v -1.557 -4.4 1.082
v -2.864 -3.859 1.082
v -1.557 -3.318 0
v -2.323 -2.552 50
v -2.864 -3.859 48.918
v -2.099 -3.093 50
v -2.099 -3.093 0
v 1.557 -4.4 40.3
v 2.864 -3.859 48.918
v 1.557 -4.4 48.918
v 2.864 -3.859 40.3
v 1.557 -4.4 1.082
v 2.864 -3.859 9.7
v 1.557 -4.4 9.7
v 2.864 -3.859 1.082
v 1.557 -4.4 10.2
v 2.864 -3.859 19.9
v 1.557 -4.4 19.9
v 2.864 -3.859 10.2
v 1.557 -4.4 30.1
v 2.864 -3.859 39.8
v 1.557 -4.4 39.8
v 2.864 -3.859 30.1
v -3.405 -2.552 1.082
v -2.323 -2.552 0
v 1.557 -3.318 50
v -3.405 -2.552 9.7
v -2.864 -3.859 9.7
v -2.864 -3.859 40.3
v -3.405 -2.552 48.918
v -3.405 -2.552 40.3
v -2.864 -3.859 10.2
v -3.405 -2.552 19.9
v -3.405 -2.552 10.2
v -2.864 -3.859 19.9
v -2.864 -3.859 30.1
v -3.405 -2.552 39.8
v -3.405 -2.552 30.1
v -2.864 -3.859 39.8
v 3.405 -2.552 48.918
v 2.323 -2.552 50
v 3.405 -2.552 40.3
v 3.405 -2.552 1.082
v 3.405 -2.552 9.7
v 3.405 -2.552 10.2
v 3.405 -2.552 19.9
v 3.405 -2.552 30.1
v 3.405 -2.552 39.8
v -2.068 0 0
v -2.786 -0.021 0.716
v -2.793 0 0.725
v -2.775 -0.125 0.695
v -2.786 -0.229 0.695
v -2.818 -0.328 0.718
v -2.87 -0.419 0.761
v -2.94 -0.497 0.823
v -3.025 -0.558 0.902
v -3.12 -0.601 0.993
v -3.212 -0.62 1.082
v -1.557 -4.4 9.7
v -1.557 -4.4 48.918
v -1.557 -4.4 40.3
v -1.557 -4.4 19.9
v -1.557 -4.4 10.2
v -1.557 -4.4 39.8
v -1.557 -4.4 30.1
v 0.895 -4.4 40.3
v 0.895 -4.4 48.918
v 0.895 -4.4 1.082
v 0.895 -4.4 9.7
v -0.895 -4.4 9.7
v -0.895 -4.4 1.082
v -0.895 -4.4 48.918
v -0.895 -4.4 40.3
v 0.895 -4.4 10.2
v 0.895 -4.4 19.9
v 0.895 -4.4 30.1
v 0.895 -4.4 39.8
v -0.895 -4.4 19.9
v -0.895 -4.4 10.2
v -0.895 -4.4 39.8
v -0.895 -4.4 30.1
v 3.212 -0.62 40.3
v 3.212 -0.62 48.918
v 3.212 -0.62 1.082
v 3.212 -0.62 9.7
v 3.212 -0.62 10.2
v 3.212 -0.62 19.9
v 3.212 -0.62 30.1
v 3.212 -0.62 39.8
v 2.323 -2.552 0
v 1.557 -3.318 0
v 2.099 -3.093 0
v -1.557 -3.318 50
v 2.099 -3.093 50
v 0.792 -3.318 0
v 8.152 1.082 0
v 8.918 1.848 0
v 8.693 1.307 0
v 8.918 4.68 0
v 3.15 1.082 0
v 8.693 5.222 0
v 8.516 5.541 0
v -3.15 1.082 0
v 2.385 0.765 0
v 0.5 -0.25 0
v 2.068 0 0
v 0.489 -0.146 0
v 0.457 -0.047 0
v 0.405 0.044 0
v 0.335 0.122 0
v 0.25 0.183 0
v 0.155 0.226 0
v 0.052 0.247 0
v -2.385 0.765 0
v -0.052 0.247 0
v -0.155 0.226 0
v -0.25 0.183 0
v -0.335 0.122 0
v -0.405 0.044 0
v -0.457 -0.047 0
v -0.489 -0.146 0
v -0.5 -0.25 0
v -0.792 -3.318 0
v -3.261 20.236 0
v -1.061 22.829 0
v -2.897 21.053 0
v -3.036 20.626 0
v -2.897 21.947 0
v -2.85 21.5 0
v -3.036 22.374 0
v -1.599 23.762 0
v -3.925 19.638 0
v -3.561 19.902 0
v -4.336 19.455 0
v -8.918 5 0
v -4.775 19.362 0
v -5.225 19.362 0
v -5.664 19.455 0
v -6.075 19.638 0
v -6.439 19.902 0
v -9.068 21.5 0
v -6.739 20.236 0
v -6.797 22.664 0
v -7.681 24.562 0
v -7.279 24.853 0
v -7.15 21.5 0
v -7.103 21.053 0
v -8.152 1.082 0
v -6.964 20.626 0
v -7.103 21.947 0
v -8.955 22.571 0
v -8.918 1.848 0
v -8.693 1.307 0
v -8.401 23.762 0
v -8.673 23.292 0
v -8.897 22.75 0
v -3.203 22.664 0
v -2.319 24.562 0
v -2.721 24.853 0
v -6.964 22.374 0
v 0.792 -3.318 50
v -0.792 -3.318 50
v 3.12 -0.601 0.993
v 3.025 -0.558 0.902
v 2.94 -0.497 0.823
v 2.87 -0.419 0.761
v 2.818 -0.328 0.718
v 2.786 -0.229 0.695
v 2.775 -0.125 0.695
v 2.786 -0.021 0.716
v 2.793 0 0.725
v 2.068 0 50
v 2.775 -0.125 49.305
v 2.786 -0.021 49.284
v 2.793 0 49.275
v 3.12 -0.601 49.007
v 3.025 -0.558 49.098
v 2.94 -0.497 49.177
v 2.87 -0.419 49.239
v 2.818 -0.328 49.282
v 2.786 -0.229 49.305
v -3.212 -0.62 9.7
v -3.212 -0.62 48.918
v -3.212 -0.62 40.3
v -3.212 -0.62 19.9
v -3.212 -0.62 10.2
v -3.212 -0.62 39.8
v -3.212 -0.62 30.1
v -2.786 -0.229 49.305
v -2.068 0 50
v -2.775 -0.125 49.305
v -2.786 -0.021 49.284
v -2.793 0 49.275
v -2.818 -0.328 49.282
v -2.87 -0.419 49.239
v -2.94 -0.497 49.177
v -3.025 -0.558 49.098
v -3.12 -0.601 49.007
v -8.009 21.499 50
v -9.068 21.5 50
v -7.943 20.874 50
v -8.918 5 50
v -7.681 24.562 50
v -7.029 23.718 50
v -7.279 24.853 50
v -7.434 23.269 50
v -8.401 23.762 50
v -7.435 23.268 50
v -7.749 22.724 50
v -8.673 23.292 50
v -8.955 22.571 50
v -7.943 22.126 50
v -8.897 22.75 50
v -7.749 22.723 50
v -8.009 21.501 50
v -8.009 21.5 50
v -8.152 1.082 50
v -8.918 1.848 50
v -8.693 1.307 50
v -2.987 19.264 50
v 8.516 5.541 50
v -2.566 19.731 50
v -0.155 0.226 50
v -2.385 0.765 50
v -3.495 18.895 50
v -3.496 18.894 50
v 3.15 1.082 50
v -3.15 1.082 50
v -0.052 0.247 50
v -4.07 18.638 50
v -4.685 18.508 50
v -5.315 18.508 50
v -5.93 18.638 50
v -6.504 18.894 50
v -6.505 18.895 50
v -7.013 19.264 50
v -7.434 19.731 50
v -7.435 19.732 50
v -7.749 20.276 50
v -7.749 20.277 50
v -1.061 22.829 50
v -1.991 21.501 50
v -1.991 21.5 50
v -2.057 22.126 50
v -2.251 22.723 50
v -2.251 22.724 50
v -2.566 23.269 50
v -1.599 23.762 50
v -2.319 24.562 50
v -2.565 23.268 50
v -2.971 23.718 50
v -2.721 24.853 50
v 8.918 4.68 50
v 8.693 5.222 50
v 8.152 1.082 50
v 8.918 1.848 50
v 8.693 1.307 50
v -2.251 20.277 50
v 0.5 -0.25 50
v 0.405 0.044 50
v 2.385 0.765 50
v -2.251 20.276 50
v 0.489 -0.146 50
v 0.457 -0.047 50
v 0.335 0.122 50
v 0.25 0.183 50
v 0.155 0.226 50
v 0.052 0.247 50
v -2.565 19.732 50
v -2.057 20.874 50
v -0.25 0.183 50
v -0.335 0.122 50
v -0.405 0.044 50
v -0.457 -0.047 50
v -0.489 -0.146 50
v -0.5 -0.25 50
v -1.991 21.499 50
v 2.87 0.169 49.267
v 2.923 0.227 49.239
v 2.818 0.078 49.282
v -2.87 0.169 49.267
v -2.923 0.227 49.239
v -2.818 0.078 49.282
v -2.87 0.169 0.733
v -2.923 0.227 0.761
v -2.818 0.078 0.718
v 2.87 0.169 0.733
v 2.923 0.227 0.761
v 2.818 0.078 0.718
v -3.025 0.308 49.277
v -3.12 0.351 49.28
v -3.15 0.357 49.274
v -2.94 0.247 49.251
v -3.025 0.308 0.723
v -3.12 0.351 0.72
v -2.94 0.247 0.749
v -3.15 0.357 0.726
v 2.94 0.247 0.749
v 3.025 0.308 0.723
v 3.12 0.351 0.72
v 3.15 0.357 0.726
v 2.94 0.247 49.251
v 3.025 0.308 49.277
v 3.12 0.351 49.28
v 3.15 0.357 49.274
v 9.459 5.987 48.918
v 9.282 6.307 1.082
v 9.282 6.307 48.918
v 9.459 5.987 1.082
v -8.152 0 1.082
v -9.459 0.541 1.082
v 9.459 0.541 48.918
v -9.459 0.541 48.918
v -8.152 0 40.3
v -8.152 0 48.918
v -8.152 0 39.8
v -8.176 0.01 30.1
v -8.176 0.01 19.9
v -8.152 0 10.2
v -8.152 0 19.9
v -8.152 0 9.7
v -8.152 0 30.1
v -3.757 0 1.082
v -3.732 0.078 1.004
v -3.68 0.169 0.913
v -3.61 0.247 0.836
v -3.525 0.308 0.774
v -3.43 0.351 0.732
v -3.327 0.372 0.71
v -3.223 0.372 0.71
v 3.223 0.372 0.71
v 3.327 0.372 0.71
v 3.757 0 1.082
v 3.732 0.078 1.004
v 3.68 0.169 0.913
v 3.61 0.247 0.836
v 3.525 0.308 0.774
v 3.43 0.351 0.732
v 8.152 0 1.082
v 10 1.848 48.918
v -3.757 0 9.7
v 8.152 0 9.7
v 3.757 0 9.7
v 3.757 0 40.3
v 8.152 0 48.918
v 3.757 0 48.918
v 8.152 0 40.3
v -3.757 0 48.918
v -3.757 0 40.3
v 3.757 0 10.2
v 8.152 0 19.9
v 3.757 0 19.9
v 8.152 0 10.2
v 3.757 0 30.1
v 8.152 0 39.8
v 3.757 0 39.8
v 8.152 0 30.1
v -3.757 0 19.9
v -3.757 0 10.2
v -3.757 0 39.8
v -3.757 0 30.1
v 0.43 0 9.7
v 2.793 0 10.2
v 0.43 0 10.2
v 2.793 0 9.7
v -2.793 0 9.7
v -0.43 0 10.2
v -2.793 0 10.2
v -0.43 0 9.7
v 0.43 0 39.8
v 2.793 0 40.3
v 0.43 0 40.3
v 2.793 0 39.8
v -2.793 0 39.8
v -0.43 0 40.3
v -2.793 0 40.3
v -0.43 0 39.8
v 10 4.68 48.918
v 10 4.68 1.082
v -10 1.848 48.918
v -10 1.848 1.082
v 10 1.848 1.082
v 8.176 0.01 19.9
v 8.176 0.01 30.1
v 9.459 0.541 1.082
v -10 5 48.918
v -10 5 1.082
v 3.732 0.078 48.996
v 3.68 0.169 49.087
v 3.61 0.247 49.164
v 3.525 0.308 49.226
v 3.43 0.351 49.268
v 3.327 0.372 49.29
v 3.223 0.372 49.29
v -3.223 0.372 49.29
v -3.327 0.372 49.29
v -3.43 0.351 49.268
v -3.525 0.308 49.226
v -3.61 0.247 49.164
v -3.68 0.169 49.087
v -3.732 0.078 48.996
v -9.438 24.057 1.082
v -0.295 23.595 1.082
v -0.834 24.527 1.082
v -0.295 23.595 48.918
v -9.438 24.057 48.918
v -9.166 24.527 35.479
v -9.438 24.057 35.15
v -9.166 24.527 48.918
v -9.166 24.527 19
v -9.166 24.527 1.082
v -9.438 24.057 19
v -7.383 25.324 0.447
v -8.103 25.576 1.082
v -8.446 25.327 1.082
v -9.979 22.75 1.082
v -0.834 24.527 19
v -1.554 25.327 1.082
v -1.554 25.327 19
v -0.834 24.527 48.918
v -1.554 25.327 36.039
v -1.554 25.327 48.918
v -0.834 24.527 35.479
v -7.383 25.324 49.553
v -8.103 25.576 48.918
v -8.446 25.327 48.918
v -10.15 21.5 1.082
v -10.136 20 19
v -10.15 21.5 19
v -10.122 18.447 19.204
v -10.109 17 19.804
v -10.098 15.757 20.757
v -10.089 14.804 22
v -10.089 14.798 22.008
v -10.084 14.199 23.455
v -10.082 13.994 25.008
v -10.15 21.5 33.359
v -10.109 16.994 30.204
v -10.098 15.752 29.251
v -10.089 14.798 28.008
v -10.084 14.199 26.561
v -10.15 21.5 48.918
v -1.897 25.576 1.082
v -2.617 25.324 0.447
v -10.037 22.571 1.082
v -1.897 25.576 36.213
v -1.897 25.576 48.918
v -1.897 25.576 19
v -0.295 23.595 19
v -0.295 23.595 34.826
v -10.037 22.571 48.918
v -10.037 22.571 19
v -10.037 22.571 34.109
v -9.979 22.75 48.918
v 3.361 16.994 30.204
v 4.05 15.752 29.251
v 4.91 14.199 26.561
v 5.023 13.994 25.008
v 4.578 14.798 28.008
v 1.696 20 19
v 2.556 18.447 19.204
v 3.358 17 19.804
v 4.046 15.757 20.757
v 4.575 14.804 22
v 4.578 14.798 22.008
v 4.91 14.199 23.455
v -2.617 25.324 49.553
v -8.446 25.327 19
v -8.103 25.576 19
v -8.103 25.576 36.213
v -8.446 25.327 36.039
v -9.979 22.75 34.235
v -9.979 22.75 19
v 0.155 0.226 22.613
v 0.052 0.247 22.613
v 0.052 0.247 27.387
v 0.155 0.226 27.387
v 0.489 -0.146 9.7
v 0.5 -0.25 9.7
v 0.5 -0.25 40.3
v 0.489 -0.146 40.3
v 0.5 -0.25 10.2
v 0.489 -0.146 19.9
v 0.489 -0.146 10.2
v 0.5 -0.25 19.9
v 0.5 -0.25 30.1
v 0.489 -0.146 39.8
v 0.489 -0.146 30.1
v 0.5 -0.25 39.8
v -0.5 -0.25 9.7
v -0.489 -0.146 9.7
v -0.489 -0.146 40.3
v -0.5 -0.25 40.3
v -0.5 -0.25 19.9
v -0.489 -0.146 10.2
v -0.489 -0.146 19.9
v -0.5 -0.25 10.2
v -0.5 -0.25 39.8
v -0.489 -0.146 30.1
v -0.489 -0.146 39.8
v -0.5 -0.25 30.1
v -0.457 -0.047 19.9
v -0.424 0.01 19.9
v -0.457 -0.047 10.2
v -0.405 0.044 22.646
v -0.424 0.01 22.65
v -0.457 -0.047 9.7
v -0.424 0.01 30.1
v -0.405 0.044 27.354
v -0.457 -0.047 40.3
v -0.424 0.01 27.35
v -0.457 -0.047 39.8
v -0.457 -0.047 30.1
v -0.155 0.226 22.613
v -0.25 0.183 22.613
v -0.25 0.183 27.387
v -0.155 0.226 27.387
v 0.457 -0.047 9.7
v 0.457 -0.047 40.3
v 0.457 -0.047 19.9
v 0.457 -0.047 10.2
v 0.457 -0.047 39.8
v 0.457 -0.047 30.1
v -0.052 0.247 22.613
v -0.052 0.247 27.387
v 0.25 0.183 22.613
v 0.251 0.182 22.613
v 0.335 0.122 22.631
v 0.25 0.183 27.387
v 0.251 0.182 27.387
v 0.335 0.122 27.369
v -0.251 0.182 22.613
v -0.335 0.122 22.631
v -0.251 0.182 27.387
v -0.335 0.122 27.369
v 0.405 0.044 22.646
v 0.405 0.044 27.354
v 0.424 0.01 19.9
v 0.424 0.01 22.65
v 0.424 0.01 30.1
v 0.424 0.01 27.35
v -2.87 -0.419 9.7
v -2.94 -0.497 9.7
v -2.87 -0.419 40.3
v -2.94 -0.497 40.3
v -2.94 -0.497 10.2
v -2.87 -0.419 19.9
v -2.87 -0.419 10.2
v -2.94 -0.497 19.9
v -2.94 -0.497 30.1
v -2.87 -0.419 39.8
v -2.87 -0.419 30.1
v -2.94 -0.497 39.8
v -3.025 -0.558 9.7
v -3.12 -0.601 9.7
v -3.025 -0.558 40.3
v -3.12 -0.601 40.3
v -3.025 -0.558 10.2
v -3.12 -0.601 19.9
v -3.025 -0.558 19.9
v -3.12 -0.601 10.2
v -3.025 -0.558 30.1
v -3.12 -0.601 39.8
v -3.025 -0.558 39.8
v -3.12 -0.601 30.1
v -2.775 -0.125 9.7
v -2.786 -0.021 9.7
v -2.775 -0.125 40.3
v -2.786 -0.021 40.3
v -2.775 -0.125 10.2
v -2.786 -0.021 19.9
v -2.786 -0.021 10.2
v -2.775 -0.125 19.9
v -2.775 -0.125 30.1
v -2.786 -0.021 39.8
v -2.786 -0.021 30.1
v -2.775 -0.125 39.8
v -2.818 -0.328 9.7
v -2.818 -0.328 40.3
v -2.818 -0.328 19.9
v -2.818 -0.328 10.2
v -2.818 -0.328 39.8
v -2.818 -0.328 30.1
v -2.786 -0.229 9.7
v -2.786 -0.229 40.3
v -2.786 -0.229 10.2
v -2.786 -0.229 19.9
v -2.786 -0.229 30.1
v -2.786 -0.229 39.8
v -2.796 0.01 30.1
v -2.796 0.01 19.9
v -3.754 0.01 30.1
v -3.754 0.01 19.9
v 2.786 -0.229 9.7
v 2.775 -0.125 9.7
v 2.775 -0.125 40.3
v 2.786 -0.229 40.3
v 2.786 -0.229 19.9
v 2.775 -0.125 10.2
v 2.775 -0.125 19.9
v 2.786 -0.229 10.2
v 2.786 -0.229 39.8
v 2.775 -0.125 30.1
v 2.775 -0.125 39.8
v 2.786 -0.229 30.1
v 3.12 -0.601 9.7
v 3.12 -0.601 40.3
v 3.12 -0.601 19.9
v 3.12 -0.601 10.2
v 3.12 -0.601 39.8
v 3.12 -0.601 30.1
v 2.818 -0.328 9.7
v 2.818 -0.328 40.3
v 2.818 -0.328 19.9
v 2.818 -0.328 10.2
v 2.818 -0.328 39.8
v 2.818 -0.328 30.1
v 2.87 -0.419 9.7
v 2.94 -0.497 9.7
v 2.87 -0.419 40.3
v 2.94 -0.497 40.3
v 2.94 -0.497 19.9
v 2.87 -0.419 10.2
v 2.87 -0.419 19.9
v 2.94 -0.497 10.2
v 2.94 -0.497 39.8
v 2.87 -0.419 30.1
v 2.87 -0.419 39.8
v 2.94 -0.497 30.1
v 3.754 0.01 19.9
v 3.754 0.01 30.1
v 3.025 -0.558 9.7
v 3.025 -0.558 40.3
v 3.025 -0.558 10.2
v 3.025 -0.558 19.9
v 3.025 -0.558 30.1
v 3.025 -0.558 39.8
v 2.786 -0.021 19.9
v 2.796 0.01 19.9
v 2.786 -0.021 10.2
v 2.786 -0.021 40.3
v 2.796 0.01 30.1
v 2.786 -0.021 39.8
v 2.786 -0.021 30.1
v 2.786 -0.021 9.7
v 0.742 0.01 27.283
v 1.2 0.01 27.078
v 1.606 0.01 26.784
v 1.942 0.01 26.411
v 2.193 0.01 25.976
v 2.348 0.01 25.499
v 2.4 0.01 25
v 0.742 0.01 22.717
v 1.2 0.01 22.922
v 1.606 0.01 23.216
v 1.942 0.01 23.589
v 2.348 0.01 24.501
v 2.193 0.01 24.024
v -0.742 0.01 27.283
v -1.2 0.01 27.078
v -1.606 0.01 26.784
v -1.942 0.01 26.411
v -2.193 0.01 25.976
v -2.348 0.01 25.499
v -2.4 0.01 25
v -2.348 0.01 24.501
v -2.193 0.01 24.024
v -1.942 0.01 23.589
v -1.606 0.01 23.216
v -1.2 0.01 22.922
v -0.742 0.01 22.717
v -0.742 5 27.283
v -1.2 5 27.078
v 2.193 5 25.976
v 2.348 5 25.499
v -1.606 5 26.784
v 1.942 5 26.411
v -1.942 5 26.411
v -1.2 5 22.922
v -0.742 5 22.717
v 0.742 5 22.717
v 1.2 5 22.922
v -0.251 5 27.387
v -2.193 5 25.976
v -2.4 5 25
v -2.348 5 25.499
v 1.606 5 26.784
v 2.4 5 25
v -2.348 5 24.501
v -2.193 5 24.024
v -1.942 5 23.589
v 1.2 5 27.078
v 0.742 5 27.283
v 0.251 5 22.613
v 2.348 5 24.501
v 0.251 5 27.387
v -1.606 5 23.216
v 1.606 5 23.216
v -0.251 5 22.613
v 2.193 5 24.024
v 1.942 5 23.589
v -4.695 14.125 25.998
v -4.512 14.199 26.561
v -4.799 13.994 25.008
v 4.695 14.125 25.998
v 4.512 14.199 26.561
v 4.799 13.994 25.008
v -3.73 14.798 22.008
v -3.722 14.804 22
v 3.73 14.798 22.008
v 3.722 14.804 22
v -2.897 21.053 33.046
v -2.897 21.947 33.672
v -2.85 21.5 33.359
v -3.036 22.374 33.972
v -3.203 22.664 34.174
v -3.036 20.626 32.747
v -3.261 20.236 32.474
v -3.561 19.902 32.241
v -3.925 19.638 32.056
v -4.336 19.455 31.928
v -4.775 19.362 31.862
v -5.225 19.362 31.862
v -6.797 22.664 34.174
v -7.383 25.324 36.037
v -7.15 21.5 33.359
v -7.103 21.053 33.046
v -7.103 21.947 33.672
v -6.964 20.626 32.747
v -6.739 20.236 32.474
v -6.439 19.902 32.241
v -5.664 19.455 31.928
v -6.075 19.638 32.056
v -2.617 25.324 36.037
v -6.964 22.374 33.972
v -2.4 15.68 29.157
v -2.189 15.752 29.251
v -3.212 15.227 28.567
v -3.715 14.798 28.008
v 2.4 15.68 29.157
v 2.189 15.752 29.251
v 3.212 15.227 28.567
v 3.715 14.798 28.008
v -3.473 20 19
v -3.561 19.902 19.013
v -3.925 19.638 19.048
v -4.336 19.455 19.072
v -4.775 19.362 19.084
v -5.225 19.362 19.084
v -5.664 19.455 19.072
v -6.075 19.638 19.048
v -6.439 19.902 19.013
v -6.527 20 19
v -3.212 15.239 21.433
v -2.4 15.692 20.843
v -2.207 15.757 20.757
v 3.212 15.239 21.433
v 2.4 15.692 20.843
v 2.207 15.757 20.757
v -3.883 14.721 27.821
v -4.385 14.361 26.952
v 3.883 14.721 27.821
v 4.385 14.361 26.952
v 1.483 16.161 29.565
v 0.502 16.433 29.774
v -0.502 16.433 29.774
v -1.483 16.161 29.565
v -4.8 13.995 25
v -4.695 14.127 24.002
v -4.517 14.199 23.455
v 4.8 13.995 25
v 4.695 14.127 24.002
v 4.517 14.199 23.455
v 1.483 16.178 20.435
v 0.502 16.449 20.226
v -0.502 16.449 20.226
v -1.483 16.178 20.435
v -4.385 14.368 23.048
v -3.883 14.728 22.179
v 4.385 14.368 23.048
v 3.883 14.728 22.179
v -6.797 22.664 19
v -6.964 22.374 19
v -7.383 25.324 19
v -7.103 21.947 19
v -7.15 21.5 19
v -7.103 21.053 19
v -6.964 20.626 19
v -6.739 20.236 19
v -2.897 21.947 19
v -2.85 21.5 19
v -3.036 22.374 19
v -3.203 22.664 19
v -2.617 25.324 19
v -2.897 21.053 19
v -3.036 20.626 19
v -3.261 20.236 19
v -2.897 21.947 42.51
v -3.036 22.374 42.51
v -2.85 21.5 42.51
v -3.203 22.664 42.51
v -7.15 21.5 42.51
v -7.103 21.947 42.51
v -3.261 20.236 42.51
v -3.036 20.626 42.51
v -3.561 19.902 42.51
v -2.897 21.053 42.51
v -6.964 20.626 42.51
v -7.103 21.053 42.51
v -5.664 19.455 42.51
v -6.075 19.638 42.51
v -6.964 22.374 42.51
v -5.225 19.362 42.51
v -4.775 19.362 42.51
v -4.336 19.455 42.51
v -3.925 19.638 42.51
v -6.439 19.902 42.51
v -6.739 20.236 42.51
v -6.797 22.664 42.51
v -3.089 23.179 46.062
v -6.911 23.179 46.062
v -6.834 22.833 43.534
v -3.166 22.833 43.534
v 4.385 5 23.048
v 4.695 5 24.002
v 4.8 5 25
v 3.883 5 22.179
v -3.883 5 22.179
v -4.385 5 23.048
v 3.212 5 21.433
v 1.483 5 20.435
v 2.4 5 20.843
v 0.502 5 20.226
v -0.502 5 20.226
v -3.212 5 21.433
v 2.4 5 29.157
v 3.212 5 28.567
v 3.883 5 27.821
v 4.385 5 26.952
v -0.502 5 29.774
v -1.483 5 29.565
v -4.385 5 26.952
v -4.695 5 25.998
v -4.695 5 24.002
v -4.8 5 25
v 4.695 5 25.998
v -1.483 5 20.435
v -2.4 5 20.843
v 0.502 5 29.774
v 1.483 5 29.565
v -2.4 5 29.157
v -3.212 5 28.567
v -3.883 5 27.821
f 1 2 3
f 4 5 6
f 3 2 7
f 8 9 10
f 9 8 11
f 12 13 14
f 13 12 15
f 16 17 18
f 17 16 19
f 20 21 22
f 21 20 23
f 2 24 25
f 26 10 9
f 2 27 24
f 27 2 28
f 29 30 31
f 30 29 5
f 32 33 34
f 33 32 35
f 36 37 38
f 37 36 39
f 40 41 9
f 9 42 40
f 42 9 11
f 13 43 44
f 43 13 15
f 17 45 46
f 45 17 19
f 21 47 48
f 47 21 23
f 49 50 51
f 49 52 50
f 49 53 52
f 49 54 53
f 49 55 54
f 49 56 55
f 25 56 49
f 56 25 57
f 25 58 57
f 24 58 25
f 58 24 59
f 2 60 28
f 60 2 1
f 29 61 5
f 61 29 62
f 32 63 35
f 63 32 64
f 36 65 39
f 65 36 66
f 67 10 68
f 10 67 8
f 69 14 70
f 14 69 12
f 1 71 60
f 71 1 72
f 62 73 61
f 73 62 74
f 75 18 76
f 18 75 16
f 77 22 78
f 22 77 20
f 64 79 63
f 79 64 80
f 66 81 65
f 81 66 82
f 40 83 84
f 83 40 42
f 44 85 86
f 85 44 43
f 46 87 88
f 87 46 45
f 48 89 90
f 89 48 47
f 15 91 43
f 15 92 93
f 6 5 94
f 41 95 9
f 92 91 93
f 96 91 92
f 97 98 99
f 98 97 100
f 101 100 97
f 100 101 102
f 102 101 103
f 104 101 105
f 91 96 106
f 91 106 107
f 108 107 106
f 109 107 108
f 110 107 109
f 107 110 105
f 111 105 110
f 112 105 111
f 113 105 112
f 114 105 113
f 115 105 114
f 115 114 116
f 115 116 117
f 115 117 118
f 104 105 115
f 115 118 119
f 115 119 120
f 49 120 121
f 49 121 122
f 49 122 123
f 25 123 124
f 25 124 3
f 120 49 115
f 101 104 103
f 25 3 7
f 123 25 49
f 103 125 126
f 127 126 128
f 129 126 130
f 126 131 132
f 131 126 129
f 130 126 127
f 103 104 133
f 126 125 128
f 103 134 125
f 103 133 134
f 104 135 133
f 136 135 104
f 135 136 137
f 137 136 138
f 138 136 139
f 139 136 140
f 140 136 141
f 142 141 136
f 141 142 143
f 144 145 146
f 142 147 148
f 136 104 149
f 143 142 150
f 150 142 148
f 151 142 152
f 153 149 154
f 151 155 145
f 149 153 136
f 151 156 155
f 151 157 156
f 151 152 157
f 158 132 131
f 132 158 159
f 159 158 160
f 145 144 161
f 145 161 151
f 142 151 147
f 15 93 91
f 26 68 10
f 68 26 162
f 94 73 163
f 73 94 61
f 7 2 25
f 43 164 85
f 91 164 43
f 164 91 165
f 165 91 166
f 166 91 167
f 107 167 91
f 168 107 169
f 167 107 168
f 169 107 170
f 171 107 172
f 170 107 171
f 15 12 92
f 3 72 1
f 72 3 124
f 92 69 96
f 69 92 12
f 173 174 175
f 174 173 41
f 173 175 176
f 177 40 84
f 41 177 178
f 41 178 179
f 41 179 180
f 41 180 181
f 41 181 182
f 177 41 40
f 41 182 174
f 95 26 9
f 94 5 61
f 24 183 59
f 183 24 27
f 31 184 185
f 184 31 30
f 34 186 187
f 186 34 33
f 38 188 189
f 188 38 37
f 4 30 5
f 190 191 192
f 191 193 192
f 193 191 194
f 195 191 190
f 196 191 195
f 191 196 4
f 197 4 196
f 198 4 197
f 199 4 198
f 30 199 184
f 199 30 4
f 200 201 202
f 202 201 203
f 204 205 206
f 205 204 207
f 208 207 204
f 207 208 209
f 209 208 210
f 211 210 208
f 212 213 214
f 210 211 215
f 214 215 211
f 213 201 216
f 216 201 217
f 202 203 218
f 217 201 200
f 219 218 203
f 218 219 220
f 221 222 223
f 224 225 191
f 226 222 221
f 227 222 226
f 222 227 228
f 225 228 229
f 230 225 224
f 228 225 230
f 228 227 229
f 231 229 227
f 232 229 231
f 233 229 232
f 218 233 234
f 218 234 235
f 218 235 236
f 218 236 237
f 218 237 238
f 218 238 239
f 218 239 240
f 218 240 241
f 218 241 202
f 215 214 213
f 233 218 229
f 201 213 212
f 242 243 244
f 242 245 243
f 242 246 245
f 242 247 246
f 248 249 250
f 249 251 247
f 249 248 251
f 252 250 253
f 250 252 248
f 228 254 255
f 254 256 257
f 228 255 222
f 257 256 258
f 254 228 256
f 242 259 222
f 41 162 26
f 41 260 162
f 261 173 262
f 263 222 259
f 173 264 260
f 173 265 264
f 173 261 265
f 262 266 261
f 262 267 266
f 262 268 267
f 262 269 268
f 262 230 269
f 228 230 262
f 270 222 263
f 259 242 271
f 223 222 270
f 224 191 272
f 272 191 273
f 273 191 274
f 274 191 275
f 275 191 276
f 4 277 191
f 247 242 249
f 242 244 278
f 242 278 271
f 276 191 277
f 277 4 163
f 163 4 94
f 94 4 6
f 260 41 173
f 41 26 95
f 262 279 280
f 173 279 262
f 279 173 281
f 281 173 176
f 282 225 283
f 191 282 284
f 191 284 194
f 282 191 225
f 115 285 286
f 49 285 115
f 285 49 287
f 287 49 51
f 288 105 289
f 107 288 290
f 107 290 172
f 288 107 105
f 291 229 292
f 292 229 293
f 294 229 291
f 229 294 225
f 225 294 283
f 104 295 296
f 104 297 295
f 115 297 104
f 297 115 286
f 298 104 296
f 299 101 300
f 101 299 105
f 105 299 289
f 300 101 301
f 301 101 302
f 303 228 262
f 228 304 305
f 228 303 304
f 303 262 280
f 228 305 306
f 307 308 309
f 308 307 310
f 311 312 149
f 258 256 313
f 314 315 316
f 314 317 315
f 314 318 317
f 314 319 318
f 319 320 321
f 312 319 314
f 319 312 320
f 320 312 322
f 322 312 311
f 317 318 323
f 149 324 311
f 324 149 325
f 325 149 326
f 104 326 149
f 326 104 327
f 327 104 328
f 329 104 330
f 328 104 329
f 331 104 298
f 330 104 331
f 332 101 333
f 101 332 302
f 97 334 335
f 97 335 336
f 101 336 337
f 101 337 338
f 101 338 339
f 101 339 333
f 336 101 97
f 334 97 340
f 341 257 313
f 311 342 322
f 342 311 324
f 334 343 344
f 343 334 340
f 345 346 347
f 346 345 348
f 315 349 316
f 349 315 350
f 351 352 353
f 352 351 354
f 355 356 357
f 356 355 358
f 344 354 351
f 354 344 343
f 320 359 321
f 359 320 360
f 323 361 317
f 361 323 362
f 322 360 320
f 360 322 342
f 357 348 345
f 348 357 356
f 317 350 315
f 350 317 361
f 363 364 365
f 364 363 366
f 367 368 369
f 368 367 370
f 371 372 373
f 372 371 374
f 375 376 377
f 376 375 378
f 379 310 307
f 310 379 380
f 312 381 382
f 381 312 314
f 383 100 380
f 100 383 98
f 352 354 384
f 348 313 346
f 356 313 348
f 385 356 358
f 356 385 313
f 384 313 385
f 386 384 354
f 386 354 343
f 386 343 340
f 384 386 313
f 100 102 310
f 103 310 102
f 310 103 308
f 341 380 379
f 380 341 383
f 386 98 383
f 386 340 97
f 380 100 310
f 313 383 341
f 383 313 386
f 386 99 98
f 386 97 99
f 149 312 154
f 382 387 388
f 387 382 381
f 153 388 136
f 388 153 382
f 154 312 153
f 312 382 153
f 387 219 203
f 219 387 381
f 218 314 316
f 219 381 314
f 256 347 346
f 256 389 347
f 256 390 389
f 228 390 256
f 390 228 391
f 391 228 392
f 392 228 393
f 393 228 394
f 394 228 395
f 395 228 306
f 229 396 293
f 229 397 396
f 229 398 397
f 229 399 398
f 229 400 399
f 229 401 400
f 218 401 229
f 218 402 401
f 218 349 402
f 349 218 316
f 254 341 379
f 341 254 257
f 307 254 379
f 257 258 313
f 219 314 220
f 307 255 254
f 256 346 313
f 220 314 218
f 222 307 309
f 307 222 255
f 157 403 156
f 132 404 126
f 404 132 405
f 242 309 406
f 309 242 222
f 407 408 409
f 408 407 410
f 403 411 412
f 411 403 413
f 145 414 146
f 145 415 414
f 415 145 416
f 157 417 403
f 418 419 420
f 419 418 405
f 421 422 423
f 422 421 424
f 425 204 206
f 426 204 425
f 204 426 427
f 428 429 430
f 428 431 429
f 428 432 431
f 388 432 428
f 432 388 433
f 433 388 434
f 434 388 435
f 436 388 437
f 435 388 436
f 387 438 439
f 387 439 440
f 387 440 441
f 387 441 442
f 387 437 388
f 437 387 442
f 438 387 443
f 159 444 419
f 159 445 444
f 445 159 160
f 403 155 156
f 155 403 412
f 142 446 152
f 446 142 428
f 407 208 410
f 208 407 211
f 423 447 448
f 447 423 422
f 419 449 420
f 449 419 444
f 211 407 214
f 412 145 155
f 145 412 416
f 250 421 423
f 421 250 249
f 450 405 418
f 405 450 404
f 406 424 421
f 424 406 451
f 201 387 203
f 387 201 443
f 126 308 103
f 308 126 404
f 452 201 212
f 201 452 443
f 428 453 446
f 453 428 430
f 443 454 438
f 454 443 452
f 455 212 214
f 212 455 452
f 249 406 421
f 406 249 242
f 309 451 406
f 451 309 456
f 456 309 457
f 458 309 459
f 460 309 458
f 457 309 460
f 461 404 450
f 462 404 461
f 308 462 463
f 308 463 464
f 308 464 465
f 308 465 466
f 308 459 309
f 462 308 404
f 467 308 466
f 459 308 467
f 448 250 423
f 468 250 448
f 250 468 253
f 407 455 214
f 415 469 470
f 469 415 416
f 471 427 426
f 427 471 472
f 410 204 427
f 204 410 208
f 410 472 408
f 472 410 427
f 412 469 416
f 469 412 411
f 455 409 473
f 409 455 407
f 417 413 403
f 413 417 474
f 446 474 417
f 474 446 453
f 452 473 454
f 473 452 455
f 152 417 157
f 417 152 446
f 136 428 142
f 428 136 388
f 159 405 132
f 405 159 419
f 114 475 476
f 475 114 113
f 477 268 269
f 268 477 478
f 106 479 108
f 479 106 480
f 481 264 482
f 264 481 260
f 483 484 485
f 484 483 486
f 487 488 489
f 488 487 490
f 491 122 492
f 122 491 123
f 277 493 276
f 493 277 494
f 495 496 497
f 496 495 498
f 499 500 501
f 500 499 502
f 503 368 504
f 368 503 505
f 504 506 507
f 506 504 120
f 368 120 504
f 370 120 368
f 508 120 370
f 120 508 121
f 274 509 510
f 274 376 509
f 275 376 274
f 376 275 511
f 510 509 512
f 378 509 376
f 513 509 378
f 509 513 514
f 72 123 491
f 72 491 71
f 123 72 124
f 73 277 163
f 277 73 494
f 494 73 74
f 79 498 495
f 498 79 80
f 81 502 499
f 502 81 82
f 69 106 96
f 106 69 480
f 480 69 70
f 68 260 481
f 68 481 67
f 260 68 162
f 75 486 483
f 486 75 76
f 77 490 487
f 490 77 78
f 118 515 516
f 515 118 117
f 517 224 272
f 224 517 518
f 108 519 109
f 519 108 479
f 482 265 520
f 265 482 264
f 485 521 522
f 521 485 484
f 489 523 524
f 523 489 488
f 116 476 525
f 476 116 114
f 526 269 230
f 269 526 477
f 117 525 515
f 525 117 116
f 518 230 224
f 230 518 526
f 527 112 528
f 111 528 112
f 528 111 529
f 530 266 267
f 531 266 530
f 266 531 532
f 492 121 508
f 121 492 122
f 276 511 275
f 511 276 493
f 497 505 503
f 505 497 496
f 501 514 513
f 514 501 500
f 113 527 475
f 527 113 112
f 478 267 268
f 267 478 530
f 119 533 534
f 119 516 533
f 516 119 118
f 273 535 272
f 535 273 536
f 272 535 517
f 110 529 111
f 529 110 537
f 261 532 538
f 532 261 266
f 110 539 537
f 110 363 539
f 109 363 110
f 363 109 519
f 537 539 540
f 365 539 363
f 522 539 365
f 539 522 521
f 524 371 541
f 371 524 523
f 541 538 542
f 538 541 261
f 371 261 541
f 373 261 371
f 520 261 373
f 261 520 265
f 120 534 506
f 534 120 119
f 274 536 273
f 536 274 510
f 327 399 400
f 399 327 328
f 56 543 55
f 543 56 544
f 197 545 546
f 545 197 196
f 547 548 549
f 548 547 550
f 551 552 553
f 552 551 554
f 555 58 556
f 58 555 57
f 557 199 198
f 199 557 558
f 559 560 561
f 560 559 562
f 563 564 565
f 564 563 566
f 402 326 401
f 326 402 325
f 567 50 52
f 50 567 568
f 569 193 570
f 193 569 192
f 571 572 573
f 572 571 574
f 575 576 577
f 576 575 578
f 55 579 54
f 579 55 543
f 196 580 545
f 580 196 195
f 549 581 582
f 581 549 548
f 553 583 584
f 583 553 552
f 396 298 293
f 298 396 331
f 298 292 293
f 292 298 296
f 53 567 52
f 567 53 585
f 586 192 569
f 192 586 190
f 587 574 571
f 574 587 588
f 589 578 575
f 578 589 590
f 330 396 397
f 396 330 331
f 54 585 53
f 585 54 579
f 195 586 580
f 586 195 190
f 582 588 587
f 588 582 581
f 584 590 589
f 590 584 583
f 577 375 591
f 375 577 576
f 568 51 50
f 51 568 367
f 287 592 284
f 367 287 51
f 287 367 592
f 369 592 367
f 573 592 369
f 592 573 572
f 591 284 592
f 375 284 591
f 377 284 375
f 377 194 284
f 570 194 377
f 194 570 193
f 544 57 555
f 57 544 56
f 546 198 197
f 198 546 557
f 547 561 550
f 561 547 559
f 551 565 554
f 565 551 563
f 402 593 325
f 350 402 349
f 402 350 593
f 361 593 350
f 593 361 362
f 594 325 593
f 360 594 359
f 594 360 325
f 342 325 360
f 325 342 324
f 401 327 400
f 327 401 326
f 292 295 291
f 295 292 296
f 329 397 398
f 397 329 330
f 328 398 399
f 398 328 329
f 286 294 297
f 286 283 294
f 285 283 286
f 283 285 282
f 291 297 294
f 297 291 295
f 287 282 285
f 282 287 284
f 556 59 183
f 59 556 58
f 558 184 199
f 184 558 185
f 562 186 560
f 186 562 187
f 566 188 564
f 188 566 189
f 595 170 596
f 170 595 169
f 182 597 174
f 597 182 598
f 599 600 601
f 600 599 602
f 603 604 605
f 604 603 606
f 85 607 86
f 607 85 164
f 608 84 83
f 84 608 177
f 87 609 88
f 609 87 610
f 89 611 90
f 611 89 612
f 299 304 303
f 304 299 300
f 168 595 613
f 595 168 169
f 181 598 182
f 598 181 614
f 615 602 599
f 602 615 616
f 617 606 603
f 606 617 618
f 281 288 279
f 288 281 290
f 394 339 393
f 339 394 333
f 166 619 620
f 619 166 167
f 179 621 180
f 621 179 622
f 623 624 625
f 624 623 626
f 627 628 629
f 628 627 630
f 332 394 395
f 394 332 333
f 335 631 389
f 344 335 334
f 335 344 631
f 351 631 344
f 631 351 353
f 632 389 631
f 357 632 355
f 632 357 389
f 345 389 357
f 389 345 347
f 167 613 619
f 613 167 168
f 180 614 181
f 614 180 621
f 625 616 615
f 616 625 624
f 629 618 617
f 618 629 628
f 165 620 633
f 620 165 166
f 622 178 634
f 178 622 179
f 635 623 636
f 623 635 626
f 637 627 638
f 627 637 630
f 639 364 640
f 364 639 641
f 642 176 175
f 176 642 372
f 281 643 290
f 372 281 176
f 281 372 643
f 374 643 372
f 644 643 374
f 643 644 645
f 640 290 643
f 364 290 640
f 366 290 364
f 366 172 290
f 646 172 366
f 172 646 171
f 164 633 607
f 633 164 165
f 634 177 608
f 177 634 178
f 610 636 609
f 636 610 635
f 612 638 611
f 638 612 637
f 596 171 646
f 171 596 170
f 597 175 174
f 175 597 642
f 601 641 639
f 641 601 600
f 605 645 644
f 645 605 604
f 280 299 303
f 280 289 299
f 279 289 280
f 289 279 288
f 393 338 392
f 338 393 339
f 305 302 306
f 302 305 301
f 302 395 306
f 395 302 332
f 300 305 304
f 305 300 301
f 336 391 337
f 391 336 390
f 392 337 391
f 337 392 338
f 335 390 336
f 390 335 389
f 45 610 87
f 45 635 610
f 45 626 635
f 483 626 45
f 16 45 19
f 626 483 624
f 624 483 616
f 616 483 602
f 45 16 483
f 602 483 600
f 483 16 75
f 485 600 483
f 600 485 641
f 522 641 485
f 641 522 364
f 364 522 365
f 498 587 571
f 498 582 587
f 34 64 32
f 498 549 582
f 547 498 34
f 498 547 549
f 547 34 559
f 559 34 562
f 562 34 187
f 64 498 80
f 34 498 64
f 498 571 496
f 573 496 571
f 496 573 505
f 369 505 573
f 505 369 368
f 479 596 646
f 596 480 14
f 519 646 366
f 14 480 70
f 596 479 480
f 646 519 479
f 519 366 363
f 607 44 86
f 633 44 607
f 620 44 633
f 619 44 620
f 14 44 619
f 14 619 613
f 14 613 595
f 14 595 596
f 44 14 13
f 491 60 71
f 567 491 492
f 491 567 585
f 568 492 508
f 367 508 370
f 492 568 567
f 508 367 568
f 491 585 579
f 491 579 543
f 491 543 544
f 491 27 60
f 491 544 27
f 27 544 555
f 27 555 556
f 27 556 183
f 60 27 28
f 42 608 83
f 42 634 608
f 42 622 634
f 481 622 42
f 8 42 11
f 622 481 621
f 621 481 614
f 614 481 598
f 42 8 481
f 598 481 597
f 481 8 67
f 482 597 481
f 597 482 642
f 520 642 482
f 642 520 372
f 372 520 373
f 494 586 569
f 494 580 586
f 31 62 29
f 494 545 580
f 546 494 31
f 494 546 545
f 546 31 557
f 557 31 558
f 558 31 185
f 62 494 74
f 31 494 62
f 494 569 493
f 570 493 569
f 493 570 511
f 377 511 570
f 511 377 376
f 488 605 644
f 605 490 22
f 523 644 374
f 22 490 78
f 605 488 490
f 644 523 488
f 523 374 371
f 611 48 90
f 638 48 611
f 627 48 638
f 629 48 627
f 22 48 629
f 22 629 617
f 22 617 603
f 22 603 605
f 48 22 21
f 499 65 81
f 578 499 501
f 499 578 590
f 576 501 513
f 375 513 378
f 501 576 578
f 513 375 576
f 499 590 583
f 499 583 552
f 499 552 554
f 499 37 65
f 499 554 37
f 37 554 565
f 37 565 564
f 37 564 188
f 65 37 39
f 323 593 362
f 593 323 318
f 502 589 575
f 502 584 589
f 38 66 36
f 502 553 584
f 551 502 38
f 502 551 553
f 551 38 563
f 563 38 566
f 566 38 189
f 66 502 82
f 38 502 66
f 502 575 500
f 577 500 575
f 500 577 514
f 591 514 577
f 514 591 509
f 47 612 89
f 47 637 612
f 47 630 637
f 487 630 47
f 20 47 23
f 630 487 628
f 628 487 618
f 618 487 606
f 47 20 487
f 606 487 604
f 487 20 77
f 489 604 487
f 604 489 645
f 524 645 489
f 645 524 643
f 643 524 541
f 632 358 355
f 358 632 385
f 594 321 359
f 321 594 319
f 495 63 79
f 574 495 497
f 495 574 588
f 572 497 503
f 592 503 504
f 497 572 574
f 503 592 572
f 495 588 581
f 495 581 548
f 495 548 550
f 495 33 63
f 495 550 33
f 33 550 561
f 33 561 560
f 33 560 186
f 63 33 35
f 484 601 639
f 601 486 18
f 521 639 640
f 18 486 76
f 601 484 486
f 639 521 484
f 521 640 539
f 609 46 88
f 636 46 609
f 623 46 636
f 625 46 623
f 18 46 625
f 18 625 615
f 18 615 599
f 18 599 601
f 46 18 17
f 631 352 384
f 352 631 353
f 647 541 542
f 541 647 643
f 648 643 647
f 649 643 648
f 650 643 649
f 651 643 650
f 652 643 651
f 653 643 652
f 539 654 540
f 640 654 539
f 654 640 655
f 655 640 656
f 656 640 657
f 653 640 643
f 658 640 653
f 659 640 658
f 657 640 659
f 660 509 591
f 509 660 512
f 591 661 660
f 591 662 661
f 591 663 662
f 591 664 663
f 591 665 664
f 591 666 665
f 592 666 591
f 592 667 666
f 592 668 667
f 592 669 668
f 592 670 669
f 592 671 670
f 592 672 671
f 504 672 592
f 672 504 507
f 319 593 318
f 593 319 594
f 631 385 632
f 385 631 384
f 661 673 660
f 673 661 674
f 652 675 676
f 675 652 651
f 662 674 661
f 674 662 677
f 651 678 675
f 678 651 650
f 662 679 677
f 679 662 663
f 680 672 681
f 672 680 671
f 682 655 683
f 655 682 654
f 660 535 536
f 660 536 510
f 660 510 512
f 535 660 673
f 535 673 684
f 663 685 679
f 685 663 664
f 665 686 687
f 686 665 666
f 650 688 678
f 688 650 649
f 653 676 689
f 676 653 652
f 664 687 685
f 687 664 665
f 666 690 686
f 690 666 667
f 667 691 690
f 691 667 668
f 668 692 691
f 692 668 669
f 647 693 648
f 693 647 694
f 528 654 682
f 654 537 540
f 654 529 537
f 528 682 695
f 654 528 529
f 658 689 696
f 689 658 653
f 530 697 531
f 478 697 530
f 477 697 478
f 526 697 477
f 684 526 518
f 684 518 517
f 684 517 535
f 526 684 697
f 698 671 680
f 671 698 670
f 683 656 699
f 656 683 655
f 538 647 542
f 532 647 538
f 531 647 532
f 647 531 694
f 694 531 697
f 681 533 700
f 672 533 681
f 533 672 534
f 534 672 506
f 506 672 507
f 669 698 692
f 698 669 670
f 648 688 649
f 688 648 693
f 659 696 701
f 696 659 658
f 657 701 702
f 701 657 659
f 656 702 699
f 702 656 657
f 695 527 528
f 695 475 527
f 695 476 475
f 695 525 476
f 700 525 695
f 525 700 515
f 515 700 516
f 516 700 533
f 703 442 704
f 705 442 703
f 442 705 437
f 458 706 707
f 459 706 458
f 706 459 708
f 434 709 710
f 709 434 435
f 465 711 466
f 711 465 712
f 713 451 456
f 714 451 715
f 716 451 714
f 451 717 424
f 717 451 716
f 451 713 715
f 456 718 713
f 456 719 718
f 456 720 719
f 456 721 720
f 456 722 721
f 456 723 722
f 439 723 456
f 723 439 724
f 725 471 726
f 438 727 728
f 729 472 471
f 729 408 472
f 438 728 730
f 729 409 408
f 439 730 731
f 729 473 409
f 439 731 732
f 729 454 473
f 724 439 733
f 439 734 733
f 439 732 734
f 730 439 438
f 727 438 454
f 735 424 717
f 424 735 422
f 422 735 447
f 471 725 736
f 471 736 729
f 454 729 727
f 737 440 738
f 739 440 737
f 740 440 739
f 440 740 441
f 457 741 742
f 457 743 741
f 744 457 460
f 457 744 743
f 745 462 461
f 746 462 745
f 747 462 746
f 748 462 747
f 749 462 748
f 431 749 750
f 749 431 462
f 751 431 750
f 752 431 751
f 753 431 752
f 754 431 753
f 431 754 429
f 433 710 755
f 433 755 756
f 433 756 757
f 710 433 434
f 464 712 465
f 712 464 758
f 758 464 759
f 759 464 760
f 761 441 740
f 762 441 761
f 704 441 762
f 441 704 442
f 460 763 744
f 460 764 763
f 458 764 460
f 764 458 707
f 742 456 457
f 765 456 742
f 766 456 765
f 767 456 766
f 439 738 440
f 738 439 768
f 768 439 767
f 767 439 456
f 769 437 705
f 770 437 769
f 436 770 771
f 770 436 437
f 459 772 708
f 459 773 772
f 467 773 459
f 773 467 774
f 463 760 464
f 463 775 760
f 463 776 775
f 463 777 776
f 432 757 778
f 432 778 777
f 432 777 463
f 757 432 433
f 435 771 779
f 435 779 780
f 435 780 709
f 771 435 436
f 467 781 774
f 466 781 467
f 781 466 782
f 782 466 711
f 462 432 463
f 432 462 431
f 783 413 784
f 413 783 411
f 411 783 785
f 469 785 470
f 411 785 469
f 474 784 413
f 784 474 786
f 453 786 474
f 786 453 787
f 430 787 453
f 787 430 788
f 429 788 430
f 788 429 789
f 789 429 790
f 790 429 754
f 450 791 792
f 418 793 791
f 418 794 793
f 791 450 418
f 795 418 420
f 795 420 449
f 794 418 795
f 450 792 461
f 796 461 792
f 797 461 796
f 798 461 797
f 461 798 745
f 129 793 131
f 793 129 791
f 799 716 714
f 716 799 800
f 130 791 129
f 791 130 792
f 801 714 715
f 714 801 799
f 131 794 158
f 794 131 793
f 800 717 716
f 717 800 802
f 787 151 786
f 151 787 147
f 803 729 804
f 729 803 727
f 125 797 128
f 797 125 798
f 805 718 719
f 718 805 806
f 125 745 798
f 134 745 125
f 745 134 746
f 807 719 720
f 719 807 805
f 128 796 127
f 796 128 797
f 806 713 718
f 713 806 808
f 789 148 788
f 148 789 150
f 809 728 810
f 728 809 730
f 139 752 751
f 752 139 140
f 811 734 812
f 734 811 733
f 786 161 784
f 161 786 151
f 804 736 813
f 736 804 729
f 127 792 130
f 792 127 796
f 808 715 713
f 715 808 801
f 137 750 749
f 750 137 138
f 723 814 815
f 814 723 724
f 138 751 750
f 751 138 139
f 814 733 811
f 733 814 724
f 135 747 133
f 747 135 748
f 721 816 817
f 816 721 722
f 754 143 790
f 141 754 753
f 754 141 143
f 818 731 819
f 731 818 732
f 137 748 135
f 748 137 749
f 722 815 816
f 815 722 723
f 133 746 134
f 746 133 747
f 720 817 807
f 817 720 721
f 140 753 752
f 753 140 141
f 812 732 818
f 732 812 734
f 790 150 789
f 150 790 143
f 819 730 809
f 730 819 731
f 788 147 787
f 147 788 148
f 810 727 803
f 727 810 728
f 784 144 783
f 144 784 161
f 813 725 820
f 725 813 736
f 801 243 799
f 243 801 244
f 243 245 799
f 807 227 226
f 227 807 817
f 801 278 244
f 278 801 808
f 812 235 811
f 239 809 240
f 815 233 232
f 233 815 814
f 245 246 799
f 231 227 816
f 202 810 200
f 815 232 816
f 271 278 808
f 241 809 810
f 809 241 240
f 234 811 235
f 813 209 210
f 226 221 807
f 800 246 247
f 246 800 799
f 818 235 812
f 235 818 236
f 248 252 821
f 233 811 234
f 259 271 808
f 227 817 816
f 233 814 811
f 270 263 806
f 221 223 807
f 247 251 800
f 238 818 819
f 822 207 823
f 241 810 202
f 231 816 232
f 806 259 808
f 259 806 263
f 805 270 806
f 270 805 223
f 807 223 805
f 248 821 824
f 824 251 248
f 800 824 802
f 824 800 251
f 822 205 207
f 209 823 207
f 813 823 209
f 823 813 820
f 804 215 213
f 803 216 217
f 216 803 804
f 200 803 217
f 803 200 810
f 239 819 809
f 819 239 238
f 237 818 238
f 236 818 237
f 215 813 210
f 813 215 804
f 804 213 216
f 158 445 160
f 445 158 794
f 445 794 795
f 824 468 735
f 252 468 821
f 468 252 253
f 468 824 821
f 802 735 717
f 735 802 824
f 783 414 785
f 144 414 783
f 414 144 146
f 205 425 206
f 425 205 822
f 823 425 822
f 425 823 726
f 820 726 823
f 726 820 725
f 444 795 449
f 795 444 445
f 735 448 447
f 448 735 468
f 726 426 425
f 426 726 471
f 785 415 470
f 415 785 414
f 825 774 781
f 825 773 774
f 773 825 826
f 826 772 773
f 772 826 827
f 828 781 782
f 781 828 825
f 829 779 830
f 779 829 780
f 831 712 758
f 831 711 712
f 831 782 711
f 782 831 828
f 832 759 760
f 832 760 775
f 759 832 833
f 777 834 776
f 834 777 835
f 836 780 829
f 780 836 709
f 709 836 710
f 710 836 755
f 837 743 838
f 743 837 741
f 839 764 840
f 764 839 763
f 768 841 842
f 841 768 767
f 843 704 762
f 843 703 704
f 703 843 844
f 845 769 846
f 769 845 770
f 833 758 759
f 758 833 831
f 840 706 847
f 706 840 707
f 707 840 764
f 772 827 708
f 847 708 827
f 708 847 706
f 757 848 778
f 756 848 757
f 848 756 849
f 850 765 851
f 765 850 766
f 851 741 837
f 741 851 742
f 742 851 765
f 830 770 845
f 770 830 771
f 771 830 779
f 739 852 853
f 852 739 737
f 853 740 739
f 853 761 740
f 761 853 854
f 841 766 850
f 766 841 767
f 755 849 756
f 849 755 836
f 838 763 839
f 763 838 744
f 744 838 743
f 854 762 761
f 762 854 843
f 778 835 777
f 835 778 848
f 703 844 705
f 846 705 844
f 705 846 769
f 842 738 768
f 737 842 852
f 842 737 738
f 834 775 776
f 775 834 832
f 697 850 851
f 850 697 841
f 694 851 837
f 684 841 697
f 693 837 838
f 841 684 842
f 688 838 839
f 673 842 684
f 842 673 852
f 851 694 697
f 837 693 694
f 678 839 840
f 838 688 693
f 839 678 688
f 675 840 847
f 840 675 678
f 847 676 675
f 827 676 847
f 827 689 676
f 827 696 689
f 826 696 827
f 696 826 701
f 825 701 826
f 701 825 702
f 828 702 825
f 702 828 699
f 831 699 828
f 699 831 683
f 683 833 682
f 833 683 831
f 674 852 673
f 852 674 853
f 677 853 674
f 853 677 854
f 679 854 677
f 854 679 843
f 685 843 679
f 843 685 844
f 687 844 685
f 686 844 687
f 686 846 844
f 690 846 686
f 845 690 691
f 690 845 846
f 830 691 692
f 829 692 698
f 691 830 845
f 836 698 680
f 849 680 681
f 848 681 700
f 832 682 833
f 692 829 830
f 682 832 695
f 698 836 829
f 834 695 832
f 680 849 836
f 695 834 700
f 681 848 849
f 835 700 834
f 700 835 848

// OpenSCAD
// file: ../chamferer.scad
INFINITY = 10000;
ATOM = .01;

module chamfer_tool(r, fn, tool) {
    if (tool=="sphere") {
        sphere(r, $fn=fn);
    }
    else if (tool=="hemisphere-up") {
        intersection() {
            sphere(r, $fn=fn);
            cylinder(r=r*2, h=r*2);
        }
    }
    else if (tool=="cone") {
        cylinder(r, r, 0, $fn=fn);
        scale([1, 1, -1])
        cylinder(r, r, 0, $fn=fn);
    }
    else if (tool=="cone-up") {
        cylinder(r, r, 0, $fn=fn, center=true);
    }
    else if (tool=="cone-down") {
        scale([1, 1, -1])
        cylinder(r, r, 0, $fn=fn, center=true);
    }
    else if (tool=="octahedron") {
        resize([r*2, r*2, r*2]) {
            cylinder(r, r, 0, $fn=4);
            scale([1, 1, -1])
            cylinder(r, r, 0, $fn=4);
        }
    }
    else if (tool=="pyramid") {
        resize([r*2, r*2, r*2]) {
            cylinder(r, r, 0, center=true, $fn=4);
        }
    }
    else if (tool=="rpyramid") {
        resize([r*2, r*2, r*2]) {
            cylinder(r, 0, r, center=true, $fn=4);
        }
    }
    else if (tool=="cylinder-z" || tool=="cylinder") {
        cylinder(r=r, h=ATOM, $fn=fn, center=true);
    }
    else if (tool=="cylinder-x") {
        rotate([0, 90, 0])
        cylinder(r=r, h=ATOM, $fn=fn, center=true);
    }
    else if (tool=="cylinder-y") {
        rotate([90, 0, 0])
        cylinder(r=r, h=ATOM, $fn=fn, center=true);
    }
    else if (tool=="cube") {
        cube(r*2, center=true);
    }
    else {
        assert(false, str("Unknown tool: ", tool));
    }
}

module shrinker(r, tool="sphere", fn=8) {
    if (!r) {
        children();
    }
    else {
        // re-invert+grow = fillet
        difference() {
            cube(INFINITY/2, center=true);

            // invert+grow = carve
            minkowski() {
                difference() {
                    cube(INFINITY, center=true);
                    children();
                }
                //cube(r, center=true);
                chamfer_tool(r, fn=fn, tool=tool);
            }
        }
    }
}

module chamferer(r, tool="sphere", fn=8, shrink=true, grow=true) {
    if (!r) {
        children();
    }
    else {
        minkowski() {
            if (shrink)
                shrinker(r, tool, fn) children();
            else
                children();
            
            if (grow)
                chamfer_tool(r, fn=fn, tool=tool);
        }
    }
}



cube(50);

translate([70, 0, 0])
chamferer(5, "hemisphere-up", $preview? 6*4 : 30)
//shrinker(5, "sphere", $preview? 6*4 : 30)
cube(50);

translate([70*2, 0, 0])
chamferer(5, "octahedron", grow=false)
cube(50);
// main file
use <../chamferer.scad>

WIDTH     = 20;
HEIGHT    = 50;
THICKNESS =  5;

RAIL_OPENING    =  6.5 -.2;
RAIL_THICKNESS  =  2.2;
STEP            = HEIGHT/5;
BOLT            = 10.2;
DIAMETER        =  4.8;

R               =  0.5;

MARGIN          =  0.33;
ATOM            =  0.01;
$fn             = 30;

module block() {
    // backplate
    translate([-WIDTH/2, -THICKNESS, 0])
    cube([WIDTH, THICKNESS, HEIGHT]);

    // body
    rotate([0, 0, 180])
    hull() {
        translate([BOWDEN_DX, BOWDEN_DY, 0])
        cylinder(d=BOWDEN_OUTER_W, h=HEIGHT);

        dx = WIDTH/2-TH*2;
        
        translate([-WIDTH/2, THICKNESS, 0])
        cube([WIDTH, ATOM, HEIGHT]);
    }
}

module attachment() {
    difference() {
        chamferer(2)
        union() {
            // backplate
            block();

            // rail
            hull() {
                translate([-RAIL_OPENING/2, 0, 0])
                cube([RAIL_OPENING, RAIL_THICKNESS*2, HEIGHT]);

                translate([-RAIL_OPENING/2-MARGIN, RAIL_THICKNESS*1.5, 0])
                cube([RAIL_OPENING + MARGIN*2, ATOM, HEIGHT]);
            }
        }

        // rail vertical slit
        hull() {
            translate([0, R/2, -ATOM/2])
            cylinder(r=R, h=HEIGHT+ATOM);

            translate([0, RAIL_THICKNESS*2.5, -ATOM/2])
            cylinder(r=R*2, h=HEIGHT+ATOM, $fn=30);
        }

        // grooves
        translate([RAIL_OPENING/2+R/4, R/4, -ATOM/2])
        cylinder(r=R, h=HEIGHT+ATOM);

        translate([-RAIL_OPENING/2-R/4, R/4, -ATOM/2])
        cylinder(r=R, h=HEIGHT+ATOM);
        
        // rail slits
        th = .5;
        dz = HEIGHT/4 - BOLT/4;
        translate([-WIDTH/2, 0, dz-th/2]) cube([WIDTH, RAIL_THICKNESS*3, th]);
        translate([-WIDTH/2, 0, HEIGHT-dz-th/2]) cube([WIDTH, RAIL_THICKNESS*3, th]);
        
    }
}
module screw_substraction() {
        // bolt space
        translate([-WIDTH/2-ATOM, -ATOM, HEIGHT/2 - BOLT/2])
        cube([WIDTH+ATOM*2, RAIL_THICKNESS*3+ATOM, BOLT]);

        // screw hole
        translate([0, THICKNESS, HEIGHT/2])
        rotate([90, 0, 0])
        cylinder(d=DIAMETER, h=THICKNESS*3);
}

TH              =  3;
BOWDEN_INNER_D  =  4.5  - .2;
BOWDEN_DY       = 21.5;
BOWDEN_DX       = -5;
BOWDEN_OUTER_W  = BOWDEN_INNER_D + TH*2;

module piece() {
    difference() {
        union() {
            rotate([0, 0, 180])
            attachment();
        }
        rotate([0, 0, 180])
        screw_substraction();

        hole_d = max(DIAMETER*1.25, BOWDEN_INNER_D);

        // bowden hole
        translate([BOWDEN_DX, BOWDEN_DY, 0])
        cylinder(d=BOWDEN_INNER_D, h=HEIGHT*3, center=true);

        // conic hole
        translate([BOWDEN_DX, BOWDEN_DY, HEIGHT*.85+ATOM])
        cylinder(d1=BOWDEN_INNER_D, d2=BOWDEN_INNER_D*1.4, h=HEIGHT*.15);


        // cable clearances
        hull() {
            translate([BOWDEN_DX, BOWDEN_DY + BOWDEN_INNER_D*.5*0, -ATOM])
            cylinder(d=BOWDEN_INNER_D *.7, h=HEIGHT+ATOM*2);

            translate([BOWDEN_DX, BOWDEN_DY+TH*2, -ATOM])
            cylinder(d=BOWDEN_INNER_D*1.3, h=HEIGHT+ATOM*2);
        }
        translate([BOWDEN_DX, BOWDEN_DY+TH*2.5-1.5, -ATOM])
        scale([1, .35, 1])
        cylinder(d=BOWDEN_INNER_D*4, h=HEIGHT+ATOM*2, $fn=4);

        // screw hole
        ds = DIAMETER*2;
        hs = BOWDEN_DY*2;
        translate([0, THICKNESS, HEIGHT/2])
        rotate([-90, 0, 0])
        cylinder(d=ds, h=hs);

        // ramp
        d = BOWDEN_DY*2;
        ch = 6;
        if (0)
            translate([0, sqrt(2)*d/2 + BOWDEN_DY - BOWDEN_INNER_D/2*2.5, HEIGHT/2])
            rotate([45, 0, 0])
            cube([WIDTH*2, d, d], center=true);
        else
            translate([-WIDTH, ch*0+THICKNESS*0+BOWDEN_DY-TH/2, HEIGHT*.5])
            chamferer(ch, "cylinder-x", fn=24, shrink=false)
            union() {
                rotate([35, 0, 0])
                cube([WIDTH*2, d, ATOM]);
                cube([WIDTH*2, d, ATOM]);
            }

    }
}


intersection() {
//%    piece();
    piece();
//    cylinder(d=1000, h=2);
}
